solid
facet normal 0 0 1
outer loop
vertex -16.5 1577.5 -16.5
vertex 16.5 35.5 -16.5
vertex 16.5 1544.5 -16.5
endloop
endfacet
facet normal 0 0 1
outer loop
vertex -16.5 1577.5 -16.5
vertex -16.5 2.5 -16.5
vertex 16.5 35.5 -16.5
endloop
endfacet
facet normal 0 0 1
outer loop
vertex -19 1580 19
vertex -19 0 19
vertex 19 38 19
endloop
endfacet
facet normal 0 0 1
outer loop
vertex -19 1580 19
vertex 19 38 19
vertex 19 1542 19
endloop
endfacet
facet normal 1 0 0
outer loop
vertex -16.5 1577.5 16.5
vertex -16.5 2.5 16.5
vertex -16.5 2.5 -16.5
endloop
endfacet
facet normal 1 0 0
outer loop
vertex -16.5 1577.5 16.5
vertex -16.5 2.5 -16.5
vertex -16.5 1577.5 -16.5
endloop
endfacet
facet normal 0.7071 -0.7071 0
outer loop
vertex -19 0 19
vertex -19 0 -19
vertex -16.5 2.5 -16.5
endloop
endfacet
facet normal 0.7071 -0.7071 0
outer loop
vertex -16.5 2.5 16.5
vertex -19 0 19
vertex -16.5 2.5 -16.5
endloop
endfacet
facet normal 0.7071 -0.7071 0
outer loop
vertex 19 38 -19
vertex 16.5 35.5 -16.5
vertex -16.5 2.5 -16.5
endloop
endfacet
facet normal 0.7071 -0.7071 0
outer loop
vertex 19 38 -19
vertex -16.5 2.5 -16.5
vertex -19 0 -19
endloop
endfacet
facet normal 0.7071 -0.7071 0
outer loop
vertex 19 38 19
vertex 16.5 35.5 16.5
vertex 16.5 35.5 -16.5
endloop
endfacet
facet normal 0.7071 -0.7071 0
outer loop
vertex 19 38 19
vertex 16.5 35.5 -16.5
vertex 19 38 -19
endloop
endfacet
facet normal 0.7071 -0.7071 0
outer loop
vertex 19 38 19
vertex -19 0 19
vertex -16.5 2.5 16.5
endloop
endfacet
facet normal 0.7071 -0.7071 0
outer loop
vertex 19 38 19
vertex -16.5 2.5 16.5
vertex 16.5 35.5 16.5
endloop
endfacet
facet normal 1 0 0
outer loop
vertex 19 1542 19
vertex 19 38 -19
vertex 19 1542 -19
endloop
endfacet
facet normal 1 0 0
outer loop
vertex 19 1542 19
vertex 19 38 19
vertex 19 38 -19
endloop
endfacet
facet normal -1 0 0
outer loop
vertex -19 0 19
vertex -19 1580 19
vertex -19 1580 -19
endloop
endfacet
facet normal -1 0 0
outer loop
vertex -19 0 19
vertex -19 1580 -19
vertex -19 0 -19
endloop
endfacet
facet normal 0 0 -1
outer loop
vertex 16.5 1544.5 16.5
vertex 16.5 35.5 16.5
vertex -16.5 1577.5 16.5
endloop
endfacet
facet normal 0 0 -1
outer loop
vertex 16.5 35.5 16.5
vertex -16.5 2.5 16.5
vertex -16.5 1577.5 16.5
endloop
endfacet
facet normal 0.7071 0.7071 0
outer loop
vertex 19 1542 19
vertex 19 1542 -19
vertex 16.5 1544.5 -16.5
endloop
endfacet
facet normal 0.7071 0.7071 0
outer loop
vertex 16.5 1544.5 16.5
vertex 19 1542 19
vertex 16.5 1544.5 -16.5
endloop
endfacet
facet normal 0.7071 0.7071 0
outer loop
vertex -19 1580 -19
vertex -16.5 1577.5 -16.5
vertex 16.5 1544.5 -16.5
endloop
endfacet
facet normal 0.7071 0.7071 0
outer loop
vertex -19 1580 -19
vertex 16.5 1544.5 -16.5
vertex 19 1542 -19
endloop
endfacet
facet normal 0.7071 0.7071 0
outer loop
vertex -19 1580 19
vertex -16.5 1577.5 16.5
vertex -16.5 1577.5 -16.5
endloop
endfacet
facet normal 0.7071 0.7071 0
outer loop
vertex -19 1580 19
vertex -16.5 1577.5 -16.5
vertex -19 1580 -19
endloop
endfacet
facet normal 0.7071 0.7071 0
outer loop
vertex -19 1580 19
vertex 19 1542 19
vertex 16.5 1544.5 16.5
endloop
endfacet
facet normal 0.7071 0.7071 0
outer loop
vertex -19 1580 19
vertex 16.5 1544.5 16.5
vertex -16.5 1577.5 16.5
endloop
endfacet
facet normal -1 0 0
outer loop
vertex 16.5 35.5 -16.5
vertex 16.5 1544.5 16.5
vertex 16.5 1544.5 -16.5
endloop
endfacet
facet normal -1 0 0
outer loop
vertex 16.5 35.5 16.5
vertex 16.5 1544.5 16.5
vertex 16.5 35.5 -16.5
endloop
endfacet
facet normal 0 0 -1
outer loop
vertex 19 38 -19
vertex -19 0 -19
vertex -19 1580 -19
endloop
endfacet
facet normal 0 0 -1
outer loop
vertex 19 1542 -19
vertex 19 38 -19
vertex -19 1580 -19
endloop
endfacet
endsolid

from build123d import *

# Parameters (mm, degrees)
SALIENTE_EXTRUIR1_DEPTH = 2.5
SALIENTE_EXTRUIR2_DEPTH = 33
SALIENTE_EXTRUIR3_DEPTH = 33
SALIENTE_EXTRUIR4_DEPTH = 2.5


with BuildPart() as part:
    # Croquis1 → Saliente-Extruir1 (new body)
    with BuildSketch(Plane.XY.offset(19)):
        Polygon((19, 1542), (-19, 1580), (-19, 0), (19, 38), align=None)
    extrude(amount=-SALIENTE_EXTRUIR1_DEPTH)

    # Croquis2 → Saliente-Extruir2 (add)
    with BuildSketch(Plane(origin=(0, 0, 16.5), x_dir=(-1, 0, 0), z_dir=(0, 0, -1))):
        Polygon((-16.5, 1544.5), (-16.5, 35.5), (-19, 38), (-19, 1542), align=None)
    extrude(amount=SALIENTE_EXTRUIR2_DEPTH)

    # Croquis3 → Saliente-Extruir3 (add)
    with BuildSketch(Plane(origin=(0, 0, 16.5), x_dir=(-1, 0, 0), z_dir=(0, 0, -1))):
        Polygon((16.5, 2.5), (16.5, 1577.5), (19, 1580), (19, 0), align=None)
    extrude(amount=SALIENTE_EXTRUIR3_DEPTH)

    # Croquis4 → Saliente-Extruir4 (add)
    with BuildSketch(Plane(origin=(0, 0, -16.5), x_dir=(-1, 0, 0), z_dir=(0, 0, -1))):
        Polygon((-19, 1542), (19, 1580), (19, 0), (-19, 38), align=None)
    extrude(amount=SALIENTE_EXTRUIR4_DEPTH)


solid = part.part
